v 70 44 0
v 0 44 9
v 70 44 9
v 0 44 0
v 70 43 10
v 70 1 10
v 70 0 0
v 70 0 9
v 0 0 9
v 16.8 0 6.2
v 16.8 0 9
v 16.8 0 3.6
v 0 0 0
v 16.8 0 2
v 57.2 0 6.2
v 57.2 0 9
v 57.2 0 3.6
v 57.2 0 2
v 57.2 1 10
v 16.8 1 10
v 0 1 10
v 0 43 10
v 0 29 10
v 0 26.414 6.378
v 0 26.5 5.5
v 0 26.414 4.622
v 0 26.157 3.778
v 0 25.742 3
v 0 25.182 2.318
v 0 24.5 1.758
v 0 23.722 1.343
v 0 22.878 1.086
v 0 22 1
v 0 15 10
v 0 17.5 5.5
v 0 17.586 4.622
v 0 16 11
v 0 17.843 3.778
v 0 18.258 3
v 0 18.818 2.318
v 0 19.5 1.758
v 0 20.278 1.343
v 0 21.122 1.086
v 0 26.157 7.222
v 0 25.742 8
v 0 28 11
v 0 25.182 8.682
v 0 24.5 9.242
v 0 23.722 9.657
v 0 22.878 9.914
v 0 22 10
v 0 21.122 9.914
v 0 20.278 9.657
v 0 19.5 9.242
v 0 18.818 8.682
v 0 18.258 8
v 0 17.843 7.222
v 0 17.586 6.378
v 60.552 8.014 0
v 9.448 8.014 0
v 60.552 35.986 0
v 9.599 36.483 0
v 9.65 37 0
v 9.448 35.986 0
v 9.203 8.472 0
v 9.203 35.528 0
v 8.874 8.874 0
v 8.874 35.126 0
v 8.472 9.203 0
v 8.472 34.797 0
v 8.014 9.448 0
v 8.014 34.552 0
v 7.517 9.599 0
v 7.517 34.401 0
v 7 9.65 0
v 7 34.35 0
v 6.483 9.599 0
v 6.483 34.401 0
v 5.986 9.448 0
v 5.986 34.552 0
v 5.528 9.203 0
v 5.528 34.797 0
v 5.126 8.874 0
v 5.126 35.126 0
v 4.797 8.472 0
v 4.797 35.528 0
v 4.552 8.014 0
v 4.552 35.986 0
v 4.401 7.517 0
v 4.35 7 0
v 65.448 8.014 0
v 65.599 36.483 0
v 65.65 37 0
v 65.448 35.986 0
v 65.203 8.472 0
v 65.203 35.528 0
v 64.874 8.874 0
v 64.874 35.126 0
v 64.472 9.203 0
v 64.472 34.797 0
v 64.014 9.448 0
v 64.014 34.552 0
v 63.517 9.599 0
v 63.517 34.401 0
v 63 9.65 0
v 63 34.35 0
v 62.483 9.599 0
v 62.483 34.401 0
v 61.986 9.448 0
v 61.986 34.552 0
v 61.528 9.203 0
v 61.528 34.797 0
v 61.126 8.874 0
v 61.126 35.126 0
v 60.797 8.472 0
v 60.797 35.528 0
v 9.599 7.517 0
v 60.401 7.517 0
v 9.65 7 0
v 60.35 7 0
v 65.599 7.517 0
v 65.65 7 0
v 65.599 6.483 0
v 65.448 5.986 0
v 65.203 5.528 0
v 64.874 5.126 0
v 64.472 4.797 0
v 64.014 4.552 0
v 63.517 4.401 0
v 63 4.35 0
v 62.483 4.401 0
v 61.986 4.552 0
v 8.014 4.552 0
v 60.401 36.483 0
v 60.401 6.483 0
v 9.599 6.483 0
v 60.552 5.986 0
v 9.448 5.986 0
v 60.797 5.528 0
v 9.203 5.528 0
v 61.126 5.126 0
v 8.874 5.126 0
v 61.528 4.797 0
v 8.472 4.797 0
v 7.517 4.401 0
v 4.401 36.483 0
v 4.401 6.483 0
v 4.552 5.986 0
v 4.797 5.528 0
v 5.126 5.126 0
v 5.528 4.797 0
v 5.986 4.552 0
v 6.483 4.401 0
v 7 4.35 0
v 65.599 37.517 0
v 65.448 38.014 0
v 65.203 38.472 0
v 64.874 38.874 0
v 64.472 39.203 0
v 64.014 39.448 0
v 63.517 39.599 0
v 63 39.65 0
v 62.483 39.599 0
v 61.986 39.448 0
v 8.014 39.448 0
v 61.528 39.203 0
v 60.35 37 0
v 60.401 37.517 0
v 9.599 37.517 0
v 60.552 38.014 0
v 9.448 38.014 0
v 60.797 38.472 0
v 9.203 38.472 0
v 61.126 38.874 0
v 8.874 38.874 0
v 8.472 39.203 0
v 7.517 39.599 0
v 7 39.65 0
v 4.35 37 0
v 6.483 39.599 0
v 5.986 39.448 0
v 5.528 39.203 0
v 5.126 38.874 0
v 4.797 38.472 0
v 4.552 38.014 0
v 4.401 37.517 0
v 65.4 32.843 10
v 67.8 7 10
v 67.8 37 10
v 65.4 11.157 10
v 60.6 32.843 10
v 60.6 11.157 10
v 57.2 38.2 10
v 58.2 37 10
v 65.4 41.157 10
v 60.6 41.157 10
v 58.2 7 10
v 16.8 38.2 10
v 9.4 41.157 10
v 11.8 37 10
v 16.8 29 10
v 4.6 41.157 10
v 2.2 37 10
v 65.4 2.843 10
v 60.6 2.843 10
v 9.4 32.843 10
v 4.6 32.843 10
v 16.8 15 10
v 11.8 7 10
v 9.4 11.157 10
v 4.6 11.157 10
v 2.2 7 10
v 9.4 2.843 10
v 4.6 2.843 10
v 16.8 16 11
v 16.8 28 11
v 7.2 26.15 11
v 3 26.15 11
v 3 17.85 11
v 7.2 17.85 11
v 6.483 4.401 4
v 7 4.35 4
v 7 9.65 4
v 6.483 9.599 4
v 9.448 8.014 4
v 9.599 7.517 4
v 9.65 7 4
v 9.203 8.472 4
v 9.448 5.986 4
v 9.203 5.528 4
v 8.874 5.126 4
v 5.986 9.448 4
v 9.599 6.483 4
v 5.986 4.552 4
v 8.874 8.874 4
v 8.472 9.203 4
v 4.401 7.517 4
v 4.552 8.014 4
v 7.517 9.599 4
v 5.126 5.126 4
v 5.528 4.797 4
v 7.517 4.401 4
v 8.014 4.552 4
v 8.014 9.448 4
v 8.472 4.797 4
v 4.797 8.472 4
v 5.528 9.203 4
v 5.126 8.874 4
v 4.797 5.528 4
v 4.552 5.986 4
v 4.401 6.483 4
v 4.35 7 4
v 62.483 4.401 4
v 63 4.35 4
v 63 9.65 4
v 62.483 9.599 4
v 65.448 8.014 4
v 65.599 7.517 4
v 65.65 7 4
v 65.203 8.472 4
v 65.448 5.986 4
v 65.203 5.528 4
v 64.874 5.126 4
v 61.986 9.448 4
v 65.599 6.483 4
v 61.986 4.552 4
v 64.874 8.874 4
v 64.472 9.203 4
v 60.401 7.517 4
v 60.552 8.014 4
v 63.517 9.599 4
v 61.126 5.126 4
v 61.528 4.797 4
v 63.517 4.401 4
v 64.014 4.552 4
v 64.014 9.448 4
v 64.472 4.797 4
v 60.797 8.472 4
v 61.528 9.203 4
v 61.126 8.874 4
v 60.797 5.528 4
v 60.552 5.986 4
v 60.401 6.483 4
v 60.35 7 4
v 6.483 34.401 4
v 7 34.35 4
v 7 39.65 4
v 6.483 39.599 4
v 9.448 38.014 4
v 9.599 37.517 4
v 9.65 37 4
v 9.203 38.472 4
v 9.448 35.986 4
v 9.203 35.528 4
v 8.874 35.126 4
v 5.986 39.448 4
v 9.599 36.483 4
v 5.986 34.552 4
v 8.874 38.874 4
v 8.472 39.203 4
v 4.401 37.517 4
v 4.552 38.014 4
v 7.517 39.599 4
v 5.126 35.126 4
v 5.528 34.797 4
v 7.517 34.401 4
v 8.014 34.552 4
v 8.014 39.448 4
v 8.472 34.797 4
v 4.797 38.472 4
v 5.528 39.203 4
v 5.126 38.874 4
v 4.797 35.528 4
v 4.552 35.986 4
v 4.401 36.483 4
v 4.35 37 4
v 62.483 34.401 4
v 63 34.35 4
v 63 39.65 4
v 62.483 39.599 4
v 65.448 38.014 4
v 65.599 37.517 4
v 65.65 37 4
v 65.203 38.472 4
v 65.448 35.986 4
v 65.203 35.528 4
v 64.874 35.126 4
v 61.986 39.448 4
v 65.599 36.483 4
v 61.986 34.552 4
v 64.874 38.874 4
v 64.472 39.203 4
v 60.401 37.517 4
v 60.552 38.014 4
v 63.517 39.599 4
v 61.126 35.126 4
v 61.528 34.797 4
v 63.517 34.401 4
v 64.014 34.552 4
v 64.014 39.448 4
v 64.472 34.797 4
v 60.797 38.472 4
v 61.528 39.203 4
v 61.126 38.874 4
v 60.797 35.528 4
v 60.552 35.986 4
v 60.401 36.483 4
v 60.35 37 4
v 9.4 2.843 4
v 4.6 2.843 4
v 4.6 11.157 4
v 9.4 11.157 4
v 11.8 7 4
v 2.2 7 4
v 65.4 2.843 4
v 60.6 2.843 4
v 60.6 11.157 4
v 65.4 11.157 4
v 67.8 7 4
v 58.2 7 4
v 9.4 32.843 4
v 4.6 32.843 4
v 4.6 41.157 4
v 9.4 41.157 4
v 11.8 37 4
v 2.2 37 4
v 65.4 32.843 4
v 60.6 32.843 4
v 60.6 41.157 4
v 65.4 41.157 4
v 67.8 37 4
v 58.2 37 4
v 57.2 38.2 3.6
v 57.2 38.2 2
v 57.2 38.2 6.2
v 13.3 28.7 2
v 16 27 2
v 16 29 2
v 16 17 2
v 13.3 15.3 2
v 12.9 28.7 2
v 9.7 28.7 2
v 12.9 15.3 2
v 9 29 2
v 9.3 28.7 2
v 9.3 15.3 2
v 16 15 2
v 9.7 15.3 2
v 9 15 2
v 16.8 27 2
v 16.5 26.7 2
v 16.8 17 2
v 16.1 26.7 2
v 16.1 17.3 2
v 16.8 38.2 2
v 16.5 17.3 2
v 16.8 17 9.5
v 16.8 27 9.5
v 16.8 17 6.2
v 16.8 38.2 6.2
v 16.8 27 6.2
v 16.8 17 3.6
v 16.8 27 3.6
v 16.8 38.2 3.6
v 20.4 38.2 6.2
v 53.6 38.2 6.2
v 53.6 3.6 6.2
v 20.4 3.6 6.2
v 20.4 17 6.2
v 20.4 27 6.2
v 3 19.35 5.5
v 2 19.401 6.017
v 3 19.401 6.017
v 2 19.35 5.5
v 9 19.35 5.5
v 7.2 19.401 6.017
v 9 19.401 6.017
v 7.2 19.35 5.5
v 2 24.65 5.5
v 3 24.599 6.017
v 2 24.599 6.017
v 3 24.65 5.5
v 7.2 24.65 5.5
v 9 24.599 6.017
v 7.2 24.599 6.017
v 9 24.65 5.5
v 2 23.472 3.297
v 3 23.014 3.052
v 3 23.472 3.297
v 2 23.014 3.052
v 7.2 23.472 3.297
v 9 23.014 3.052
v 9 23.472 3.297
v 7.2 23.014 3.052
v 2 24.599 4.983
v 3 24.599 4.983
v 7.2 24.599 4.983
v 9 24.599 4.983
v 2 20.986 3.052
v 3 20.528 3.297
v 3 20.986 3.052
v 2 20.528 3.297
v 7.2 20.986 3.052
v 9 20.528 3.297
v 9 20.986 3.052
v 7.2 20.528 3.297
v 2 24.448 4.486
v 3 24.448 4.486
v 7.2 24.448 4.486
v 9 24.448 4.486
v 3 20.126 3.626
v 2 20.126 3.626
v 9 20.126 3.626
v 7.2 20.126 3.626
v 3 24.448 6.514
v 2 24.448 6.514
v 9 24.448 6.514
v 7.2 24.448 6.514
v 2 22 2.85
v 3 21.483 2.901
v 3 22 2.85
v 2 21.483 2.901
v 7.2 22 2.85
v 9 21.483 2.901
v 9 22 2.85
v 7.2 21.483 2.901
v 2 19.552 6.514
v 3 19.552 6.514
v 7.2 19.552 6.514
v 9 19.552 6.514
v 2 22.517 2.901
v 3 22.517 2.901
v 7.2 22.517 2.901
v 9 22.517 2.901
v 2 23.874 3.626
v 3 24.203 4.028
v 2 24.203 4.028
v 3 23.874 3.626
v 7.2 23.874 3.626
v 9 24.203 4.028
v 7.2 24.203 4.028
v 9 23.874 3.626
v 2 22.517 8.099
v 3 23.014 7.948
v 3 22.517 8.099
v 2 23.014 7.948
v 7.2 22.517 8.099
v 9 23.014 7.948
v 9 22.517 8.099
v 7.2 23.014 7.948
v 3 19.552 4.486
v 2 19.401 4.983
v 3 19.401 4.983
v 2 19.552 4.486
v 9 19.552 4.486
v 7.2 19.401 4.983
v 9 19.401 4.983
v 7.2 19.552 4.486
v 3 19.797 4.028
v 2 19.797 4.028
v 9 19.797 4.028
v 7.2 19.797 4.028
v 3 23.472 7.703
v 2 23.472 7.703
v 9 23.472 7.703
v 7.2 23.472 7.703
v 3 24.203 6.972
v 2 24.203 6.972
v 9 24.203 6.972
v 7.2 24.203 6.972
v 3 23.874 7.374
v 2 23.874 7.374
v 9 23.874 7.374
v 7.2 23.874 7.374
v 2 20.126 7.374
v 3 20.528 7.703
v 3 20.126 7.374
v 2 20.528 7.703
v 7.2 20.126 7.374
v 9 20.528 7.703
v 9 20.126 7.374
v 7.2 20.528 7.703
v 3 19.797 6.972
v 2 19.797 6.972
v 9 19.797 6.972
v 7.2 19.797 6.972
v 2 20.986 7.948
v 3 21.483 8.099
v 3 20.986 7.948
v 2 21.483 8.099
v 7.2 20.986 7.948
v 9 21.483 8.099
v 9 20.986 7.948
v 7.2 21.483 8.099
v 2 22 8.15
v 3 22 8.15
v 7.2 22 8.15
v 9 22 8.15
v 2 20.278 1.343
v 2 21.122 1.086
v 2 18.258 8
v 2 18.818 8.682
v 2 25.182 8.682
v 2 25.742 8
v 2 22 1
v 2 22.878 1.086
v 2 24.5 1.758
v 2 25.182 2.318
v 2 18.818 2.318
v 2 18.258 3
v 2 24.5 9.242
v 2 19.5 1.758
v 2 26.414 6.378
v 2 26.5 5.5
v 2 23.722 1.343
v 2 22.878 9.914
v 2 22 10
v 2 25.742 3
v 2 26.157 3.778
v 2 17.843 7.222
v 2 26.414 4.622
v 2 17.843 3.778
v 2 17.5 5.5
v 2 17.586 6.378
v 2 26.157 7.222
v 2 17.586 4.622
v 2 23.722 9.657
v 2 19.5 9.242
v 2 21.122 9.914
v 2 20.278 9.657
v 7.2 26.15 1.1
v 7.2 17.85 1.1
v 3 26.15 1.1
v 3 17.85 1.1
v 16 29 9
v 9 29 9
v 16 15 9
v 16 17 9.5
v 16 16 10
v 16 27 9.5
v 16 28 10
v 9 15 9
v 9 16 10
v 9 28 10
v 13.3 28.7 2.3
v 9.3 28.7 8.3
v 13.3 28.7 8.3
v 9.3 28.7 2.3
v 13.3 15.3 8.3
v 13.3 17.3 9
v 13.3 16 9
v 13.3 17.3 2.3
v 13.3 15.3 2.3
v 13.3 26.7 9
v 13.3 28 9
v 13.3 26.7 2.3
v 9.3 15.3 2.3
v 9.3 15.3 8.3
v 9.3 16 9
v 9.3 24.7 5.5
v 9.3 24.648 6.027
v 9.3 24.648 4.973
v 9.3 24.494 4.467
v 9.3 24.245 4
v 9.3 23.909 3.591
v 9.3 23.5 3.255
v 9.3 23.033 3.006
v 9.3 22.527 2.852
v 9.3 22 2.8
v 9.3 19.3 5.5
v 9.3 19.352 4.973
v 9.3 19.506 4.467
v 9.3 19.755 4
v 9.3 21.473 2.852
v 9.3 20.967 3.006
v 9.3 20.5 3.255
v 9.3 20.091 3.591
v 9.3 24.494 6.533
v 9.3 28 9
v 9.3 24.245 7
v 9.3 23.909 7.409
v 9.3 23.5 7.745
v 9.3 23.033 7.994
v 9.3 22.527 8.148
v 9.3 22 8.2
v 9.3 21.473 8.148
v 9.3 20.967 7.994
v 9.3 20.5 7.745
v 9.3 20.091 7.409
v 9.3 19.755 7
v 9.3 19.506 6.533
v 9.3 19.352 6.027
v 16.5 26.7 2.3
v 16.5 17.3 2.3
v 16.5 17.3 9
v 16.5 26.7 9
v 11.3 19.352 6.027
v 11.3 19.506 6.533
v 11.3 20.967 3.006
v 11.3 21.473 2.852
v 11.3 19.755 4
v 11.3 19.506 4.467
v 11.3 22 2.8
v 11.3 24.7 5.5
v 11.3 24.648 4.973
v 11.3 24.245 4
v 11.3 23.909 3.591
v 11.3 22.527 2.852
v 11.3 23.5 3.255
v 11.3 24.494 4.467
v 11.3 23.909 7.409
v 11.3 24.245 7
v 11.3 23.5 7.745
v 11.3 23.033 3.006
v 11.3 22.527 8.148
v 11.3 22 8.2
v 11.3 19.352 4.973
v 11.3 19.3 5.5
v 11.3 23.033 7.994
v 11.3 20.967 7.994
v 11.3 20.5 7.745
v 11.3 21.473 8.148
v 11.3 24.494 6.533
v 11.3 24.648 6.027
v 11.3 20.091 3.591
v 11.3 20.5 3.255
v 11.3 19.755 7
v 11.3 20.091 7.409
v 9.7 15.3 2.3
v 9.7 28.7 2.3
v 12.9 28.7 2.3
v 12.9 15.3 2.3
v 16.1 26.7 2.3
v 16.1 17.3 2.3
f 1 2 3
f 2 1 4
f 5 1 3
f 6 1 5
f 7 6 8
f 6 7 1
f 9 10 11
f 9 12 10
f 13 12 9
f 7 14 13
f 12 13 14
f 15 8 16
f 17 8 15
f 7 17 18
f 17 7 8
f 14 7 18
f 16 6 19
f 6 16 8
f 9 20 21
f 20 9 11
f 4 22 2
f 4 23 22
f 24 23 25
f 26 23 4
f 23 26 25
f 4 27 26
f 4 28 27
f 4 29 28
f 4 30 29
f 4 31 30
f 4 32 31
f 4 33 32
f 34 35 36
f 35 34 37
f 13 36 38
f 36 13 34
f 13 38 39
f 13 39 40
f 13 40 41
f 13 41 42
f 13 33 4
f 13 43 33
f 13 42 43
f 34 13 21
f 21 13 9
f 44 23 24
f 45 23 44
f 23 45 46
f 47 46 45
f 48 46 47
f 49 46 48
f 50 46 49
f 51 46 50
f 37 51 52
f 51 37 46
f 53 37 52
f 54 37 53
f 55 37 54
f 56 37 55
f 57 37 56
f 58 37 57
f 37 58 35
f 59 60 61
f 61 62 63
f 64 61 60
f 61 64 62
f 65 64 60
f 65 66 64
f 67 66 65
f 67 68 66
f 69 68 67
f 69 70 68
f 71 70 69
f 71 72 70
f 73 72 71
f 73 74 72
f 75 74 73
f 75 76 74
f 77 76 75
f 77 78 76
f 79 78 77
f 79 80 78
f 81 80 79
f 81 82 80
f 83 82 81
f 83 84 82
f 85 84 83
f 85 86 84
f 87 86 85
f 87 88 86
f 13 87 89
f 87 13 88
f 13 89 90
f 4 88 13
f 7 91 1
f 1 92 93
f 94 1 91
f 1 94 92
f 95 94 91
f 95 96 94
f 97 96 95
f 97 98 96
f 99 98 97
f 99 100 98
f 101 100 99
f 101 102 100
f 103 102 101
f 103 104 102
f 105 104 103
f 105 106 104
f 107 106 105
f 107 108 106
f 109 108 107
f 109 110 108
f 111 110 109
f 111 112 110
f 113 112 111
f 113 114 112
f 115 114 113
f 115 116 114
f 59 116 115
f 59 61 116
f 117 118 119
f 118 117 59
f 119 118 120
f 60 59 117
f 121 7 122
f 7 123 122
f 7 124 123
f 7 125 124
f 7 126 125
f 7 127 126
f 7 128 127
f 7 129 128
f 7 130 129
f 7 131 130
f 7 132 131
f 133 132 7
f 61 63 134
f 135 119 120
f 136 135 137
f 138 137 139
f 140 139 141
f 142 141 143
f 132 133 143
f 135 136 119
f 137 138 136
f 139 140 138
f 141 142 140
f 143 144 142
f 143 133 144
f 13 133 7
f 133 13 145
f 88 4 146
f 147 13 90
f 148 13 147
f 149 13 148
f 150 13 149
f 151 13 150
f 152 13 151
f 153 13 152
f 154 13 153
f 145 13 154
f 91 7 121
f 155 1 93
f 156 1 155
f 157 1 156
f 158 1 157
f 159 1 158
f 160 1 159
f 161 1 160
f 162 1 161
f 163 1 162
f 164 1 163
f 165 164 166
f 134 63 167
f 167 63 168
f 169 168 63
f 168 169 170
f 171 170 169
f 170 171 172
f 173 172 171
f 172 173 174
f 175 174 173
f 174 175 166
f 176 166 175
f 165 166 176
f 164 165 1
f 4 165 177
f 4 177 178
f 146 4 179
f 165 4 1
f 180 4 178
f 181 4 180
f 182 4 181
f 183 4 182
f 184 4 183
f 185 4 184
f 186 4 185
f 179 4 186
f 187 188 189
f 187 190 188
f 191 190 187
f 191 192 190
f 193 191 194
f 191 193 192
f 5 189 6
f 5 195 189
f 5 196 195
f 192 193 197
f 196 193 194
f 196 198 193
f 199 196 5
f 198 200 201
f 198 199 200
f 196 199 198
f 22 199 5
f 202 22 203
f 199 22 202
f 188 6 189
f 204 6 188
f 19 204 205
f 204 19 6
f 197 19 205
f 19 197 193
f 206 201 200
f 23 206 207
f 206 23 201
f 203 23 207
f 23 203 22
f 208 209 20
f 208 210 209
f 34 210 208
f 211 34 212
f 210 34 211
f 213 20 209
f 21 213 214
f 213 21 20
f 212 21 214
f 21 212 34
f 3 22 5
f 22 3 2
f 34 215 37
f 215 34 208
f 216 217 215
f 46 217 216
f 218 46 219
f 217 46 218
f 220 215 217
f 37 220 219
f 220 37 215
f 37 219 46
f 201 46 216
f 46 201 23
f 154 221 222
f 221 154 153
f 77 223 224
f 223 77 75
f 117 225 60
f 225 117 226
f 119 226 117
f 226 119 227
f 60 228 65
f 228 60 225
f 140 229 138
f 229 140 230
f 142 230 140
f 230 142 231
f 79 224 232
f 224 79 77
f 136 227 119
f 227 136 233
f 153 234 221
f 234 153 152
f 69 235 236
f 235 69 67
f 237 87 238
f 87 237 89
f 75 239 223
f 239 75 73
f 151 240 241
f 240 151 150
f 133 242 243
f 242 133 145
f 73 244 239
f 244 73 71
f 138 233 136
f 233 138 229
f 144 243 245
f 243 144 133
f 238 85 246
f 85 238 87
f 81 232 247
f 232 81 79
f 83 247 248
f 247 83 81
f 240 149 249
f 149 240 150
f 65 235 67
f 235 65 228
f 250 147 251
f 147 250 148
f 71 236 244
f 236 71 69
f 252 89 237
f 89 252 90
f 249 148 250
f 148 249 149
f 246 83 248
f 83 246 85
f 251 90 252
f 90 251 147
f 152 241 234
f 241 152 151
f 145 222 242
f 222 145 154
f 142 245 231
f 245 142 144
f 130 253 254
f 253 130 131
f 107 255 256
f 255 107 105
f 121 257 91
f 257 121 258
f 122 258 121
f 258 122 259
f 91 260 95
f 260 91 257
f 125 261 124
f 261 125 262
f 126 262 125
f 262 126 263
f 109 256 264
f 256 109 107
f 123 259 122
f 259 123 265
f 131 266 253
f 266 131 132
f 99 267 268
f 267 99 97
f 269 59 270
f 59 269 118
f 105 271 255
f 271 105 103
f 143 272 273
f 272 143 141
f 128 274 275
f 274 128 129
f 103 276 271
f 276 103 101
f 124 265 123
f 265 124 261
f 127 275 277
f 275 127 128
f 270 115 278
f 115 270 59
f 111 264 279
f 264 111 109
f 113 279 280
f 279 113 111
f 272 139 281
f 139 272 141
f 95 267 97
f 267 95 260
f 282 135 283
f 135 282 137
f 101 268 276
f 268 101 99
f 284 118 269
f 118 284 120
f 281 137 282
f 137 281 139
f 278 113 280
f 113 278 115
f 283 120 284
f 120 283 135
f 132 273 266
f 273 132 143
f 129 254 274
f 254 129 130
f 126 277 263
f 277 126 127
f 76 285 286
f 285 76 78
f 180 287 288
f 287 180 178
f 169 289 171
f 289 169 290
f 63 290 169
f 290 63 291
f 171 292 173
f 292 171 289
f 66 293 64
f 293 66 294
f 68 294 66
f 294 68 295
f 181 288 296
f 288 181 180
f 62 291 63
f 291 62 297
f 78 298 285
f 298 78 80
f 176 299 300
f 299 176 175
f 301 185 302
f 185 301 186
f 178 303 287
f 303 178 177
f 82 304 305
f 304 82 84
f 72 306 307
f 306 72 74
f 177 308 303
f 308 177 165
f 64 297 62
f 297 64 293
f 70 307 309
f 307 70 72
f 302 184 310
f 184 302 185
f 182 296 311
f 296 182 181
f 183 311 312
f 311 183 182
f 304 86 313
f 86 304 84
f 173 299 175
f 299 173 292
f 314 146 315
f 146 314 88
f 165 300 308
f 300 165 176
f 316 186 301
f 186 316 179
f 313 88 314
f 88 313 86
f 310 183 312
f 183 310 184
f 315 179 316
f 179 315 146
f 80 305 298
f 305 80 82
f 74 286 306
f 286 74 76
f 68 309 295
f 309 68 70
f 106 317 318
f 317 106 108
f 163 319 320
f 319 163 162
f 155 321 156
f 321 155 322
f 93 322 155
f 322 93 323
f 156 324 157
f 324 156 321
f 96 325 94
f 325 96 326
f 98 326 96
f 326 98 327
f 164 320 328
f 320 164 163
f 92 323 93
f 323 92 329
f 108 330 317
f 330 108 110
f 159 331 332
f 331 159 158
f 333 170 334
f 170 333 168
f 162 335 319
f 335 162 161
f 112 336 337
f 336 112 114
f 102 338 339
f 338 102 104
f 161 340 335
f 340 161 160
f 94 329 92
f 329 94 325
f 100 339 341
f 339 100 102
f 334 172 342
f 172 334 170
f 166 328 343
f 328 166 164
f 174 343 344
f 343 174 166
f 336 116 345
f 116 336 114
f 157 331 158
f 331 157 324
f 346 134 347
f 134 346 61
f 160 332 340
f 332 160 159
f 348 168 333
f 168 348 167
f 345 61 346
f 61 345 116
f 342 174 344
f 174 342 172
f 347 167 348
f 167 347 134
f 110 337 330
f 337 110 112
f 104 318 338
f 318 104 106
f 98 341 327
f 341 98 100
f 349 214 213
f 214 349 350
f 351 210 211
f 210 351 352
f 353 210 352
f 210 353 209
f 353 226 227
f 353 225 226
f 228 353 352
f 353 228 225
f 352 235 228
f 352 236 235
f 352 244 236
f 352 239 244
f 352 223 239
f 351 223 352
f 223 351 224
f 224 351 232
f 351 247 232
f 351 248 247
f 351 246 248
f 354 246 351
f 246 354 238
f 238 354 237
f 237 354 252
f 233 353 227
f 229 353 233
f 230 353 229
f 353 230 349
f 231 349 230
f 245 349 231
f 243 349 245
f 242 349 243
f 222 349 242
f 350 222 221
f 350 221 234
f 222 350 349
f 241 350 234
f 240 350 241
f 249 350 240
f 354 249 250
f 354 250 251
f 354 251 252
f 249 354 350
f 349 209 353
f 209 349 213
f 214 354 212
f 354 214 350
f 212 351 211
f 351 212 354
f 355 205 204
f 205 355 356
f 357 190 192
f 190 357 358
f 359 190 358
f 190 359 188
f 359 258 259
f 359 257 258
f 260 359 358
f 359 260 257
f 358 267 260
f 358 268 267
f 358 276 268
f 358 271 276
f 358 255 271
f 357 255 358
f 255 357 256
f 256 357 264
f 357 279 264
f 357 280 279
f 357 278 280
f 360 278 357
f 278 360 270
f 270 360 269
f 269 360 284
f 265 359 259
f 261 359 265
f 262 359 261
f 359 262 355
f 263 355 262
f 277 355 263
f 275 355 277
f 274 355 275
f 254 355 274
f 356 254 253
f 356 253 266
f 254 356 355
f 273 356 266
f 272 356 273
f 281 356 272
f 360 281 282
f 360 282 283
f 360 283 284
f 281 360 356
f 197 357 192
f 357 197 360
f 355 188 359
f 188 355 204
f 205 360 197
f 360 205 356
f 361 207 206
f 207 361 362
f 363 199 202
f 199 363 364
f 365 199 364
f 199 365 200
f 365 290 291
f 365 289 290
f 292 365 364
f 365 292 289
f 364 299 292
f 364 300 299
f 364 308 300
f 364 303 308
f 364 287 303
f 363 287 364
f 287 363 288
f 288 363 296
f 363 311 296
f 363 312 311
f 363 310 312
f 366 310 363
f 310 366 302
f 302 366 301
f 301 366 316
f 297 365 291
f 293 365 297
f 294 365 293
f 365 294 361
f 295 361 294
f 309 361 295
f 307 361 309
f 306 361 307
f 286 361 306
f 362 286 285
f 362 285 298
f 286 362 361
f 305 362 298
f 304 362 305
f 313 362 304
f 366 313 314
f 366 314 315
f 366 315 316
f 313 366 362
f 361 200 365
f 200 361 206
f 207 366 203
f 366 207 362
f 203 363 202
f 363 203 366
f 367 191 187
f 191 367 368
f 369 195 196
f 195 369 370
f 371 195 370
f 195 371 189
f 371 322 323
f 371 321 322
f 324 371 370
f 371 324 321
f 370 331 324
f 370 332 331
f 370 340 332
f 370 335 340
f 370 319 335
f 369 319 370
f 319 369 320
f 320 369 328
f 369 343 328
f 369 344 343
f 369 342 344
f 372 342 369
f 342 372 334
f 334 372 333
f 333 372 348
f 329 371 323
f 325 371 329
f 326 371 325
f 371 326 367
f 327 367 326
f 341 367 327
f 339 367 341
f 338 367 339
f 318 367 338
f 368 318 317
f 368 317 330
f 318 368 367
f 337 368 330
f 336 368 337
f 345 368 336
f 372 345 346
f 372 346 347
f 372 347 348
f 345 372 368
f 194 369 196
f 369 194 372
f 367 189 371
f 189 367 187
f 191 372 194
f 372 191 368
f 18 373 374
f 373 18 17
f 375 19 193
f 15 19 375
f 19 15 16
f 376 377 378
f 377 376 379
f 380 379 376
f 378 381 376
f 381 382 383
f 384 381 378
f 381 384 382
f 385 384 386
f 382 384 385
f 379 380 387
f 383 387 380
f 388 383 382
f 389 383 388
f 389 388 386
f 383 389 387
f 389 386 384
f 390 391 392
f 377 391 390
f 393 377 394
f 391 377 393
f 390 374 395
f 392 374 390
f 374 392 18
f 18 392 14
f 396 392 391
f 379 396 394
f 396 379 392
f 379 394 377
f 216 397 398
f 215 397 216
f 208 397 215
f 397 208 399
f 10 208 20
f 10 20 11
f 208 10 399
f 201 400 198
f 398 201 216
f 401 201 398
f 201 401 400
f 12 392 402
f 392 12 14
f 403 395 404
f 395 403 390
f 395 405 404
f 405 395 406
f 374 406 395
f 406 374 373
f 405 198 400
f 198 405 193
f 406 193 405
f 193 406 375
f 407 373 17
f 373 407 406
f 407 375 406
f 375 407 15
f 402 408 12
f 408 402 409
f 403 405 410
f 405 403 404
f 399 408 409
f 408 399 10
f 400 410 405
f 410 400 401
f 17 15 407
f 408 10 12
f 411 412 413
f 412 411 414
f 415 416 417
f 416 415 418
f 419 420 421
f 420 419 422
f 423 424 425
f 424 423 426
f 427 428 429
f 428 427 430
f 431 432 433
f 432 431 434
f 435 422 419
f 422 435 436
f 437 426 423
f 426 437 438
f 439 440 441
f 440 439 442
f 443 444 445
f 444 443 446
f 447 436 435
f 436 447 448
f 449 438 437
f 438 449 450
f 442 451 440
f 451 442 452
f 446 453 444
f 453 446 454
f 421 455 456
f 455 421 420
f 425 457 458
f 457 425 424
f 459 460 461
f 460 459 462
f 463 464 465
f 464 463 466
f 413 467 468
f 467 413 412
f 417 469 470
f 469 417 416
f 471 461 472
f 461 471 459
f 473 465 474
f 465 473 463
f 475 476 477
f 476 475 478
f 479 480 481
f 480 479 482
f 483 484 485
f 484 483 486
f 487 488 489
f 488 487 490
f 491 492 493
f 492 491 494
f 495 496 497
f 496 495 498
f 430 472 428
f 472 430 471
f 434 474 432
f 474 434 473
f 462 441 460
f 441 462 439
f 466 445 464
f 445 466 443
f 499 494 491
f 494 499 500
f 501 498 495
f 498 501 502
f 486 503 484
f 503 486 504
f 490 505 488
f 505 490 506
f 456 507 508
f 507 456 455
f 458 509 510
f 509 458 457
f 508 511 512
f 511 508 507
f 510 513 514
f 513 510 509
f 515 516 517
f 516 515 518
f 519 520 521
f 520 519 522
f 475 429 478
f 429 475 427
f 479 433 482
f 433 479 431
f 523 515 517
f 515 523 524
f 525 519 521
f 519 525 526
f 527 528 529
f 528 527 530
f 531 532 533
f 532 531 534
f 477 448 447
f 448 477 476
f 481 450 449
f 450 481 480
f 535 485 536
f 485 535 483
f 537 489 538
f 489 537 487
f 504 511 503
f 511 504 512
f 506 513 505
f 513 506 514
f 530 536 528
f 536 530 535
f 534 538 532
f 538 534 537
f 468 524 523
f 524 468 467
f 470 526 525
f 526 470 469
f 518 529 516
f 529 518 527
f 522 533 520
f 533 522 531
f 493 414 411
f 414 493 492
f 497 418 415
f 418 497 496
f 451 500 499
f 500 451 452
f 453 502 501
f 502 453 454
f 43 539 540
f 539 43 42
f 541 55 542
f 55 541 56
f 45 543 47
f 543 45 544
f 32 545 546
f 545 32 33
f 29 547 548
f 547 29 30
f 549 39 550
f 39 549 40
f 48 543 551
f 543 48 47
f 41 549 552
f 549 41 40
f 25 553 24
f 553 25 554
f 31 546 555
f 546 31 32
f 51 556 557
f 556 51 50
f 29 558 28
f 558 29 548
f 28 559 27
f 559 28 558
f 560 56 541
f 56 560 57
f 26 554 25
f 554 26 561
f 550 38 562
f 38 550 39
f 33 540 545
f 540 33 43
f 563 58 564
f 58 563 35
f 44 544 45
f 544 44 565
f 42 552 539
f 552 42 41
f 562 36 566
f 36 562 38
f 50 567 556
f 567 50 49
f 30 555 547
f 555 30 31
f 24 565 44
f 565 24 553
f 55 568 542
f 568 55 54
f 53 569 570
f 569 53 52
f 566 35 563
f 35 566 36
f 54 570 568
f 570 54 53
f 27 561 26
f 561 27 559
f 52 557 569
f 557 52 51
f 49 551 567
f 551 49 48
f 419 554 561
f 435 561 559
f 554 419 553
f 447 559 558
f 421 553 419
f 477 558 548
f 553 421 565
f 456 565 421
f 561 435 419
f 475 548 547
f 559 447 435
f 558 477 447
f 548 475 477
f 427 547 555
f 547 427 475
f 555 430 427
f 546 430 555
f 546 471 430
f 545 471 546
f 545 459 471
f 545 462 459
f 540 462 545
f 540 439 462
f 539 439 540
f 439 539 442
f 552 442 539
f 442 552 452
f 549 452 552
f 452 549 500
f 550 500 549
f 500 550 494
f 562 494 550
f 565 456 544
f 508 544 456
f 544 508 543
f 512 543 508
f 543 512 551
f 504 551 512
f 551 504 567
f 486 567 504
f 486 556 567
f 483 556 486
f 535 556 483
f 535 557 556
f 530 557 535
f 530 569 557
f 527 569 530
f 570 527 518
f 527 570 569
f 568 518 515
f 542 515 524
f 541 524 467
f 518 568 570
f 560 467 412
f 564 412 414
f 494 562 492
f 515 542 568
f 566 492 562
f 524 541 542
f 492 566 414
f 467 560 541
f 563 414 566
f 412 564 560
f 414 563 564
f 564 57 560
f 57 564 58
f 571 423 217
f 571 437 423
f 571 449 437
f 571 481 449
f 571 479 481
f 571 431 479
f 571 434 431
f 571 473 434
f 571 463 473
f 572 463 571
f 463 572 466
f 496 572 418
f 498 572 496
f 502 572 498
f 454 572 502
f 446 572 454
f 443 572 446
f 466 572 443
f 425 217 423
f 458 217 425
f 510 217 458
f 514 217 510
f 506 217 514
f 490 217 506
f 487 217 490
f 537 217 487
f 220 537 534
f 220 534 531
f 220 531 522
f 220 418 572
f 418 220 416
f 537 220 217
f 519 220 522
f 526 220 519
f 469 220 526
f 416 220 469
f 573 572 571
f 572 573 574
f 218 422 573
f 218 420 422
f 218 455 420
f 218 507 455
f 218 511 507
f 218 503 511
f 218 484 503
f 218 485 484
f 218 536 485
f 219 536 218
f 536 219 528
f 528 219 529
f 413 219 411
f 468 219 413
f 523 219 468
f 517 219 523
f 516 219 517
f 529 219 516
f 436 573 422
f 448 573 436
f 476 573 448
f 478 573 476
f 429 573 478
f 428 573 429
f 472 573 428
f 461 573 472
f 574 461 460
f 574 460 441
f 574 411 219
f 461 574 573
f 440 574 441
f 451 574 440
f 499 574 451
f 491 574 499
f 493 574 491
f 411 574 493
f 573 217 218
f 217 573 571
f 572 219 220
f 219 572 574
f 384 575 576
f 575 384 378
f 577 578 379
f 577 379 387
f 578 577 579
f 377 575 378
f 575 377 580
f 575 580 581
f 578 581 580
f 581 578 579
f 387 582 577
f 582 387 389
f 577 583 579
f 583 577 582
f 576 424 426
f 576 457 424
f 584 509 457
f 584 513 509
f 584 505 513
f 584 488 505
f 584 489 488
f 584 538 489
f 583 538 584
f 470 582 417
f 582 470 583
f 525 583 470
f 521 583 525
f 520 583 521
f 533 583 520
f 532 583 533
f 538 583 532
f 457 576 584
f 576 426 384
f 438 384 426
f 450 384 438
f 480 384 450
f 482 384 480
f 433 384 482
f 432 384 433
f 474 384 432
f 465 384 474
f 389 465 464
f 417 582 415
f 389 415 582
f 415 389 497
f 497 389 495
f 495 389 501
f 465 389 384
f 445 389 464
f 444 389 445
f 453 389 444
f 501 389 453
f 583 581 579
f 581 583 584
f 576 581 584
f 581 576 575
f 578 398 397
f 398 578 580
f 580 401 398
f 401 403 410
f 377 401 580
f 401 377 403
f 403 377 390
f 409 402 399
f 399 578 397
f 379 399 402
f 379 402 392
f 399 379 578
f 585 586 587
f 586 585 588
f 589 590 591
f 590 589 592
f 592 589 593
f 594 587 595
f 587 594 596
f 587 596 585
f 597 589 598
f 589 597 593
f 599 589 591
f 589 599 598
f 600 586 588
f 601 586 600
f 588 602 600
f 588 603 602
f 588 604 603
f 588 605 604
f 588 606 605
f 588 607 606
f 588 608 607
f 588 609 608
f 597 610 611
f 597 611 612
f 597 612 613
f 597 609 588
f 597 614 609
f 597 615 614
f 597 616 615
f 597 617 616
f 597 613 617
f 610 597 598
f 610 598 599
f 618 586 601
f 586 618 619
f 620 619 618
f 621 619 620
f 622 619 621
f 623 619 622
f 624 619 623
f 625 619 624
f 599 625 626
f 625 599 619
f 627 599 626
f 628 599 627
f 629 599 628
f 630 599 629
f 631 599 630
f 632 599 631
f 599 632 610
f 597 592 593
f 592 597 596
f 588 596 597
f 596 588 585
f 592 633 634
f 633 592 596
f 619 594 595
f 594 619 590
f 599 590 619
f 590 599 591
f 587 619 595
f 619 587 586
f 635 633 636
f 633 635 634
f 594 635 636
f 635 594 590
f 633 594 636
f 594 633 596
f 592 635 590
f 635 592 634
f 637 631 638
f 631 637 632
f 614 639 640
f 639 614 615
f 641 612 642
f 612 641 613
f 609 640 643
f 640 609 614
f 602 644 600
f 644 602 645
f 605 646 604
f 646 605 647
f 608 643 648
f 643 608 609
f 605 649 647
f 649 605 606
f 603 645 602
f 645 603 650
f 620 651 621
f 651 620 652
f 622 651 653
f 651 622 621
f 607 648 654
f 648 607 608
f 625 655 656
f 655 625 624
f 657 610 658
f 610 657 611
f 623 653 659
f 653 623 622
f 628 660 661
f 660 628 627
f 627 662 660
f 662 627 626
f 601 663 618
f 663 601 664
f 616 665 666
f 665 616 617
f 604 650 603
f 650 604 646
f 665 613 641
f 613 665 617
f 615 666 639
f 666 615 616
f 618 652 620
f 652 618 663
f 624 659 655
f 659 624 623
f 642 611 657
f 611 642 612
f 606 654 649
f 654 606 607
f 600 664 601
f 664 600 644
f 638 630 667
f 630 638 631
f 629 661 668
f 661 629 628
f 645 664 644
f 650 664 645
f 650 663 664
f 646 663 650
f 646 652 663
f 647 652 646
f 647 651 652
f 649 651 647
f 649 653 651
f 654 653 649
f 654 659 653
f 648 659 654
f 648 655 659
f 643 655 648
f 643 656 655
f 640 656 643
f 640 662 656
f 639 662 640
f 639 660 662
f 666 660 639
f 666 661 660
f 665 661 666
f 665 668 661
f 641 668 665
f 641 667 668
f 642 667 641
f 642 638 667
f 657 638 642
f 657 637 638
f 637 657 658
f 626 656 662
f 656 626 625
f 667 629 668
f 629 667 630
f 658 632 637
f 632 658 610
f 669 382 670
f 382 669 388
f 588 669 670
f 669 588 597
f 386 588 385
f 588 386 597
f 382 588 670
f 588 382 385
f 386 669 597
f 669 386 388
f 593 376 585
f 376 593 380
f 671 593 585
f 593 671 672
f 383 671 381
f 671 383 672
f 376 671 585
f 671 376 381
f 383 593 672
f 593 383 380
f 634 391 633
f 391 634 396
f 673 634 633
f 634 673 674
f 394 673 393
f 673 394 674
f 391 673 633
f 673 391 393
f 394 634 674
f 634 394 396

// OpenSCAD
size = [70, 44, 10];

fins = [[4, 1.4], [0.4, 4], [4, 4]];

tol2 = 0.3;

difference() {
    translate([0, 0, 0]) clamp();
    //translate([0, 0, 2.0]) cube([100, 100, 100]);
    
}    
//translate([0, 50, 0]) plate();

module plate() {
    difference() {
        union() {

            points_cube = [[0, 0], [44, 0], [44, 8-1], [44-1, 8], [1, 8], [0, 8-1]];
            translate([0, , 0]) rotate([90, 0, 90]) linear_extrude(height=70) polygon(points_cube);
        }    
        
        dist = 7;
        translate([0, 0, -1]) {
            translate([dist, dist]) cylinder($fn=32, h=12, d=5.3);
            translate([size[0]-dist, dist]) cylinder($fn=32, h=12, d=5.3);
            translate([dist, size[1]-dist]) cylinder($fn=32, h=12, d=5.3);
            translate([size[0]-dist, size[1]-dist]) cylinder($fn=32, h=12, d=5.3);
        }
        translate([0, 0, 2.5]) {
            translate([dist, dist]) cylinder($fn=32, h=12, d=9);
            translate([size[0]-dist, dist]) cylinder($fn=32, h=12, d=9);
            translate([dist, size[1]-dist]) cylinder($fn=32, h=12, d=9);
            translate([size[0]-dist, size[1]-dist]) cylinder($fn=32, h=12, d=9);
        }
        translate([size[0]/2, size[1]/2, -1]) cylinder($fn=32, h=12, d=7);
        translate([size[0]/2, size[1]/2, -0.01]) cylinder($fn=6, h=6+1, d=13.2);  // +1 safety margin for long fastening screws
    }
}

module clamp() {
difference() {
    union() {
        difference() {
            union() {
                //cube(size);

                points_cube = [ [0, 0], 
                                [size[1], 0], 
                                [size[1], size[2]-1], 
                                [size[1]-1, size[2]], 
                                [1, size[2]], 
                                [0, size[2]-1]];
                translate([0, , 0]) rotate([90, 0, 90]) linear_extrude(height=70) polygon(points_cube);
            
                points = [  [0, 0], 
                            [14, 0], 
                            [14, size[2]], 
                            [14-1, size[2]+1], 
                            [1, size[2]+1], 
                            [0, size[2]]];
                translate([0, 15, 0]) rotate([90, 0, 90]) linear_extrude(height=30) polygon(points);
            }
                    
            tol = 0.2;
            translate([17-tol, -2, 2]) color("red") cube([40+2*tol, 40+tol, 10]);
            
            dist = 7;
            translate([0, 0, -1]) {
                translate([dist, dist]) cylinder($fn=32, h=12, d=5.3);
                translate([size[0]-dist, dist]) cylinder($fn=32, h=12, d=5.3);
                translate([dist, size[1]-dist]) cylinder($fn=32, h=12, d=5.3);
                translate([size[0]-dist, size[1]-dist]) cylinder($fn=32, h=12, d=5.3);
            }
            translate([0, 0, 4]) {
                translate([dist, dist]) cylinder($fn=6, h=12, d=9.6);
                translate([size[0]-dist, dist]) cylinder($fn=6, h=12, d=9.6);
                translate([dist, size[1]-dist]) cylinder($fn=6, h=12, d=9.6);
                translate([size[0]-dist, size[1]-dist]) cylinder($fn=6, h=12, d=9.6);
            }
        }
 
        difference() {
            union() {
                translate([17+40-4+0.2, 40, 2.2]) rotate([90, 0, 0]) color("blue") linear_extrude(height=40) polygon(fins);
                translate([17+4-0.2, 0, 2.2]) rotate([90, 0, 180]) color("blue") linear_extrude(height=40) polygon(fins);
            }
            points_cutter = [[0, 0], [4, 0], [0, 4]];
            translate([53+0.2, 0, 2]) rotate([0, 0, 0]) color("green") linear_extrude(height=10) polygon(points_cutter);
            translate([21-0.2, 0, 2]) rotate([0, 0, 90]) color("green") linear_extrude(height=10) polygon(points_cutter);
        }
    }

    translate([-1, 22, 5.5]) rotate([0, 90, 0]) cylinder($fn=32, h=40, d=5.3);
    translate([-8.0, 22, 5.5]) rotate([0, 90, 0]) cylinder($fn=32, h=10, d=9);
        
    // translate([10, 15.75, 1.6]) cube([3, 8.3, 9]); // square nut
    translate([3, 17.85, 1.1]) cube([4.2, 8.3, 10]); // normal M5 nut
    
    //translate([9, 15, 2.0]) cube([7, 14, 7.5]); // pressure nose
    points = [  [0, 0], 
                            [14, 0], 
                            [14, 7], 
                            [14-1, 7+1], 
                            [1, 7+1], 
                            [0, 7]];
    translate([9, 15, 2.0]) rotate([90, 0, 90]) linear_extrude(height=7) polygon(points);
    translate([15, 17, 2.0]) cube([7, 10, 7.5]); // pressure nose

}

    translate([9+tol2, 15, 2]) {
    //translate([10, 50, 0]) rotate([0, -90, 0]) {
       
        bottom_height = 2;
        height = 4;
        x=2;
        
        translate([0, tol2, 0]) cube([0.4, 14-2*tol2, 0.3]);
        translate([4-0.4, tol2, 0]) cube([0.4, 14-2*tol2, 0.3]);
        translate([7-0.2, 2+tol2, 0]) cube([0.4, 14-2*tol2-4, 0.3]);
        
        translate([0, 0, 0.3]) difference() {
            // body
            union() {
                
                
                points = [[tol2, 0], [14-tol2, 0], [14-tol2, size[2]-bottom_height-x], [14-1, size[2]+1-tol2-bottom_height-x], [1, size[2]+1-tol2-bottom_height-x], [0+tol2, size[2]-bottom_height-x]];
                translate([0, 0, 0]) rotate([90, 0, 90]) linear_extrude(height=height) polygon(points);
                translate([height, 2+tol2, 0]) cube([3.2, 10-2*tol2, size[2]+1-tol2-bottom_height-x]);  
            }
            //translate([0, tol2, 0]) cube([height, 14-2*tol2, 6.5]);
            
            // screw hole
            translate([-1, 7, 5.5-bottom_height-tol2]) rotate([0, 90, 0]) cylinder($fn=32, h=3, d=5.4);    
        }
        
        // fins
        //translate([height+4, tol2, -tol2+0.2]) rotate([90, 0, 180]) color("blue") linear_extrude(height=14-2*tol2) polygon(fins);
    
    } 
}
